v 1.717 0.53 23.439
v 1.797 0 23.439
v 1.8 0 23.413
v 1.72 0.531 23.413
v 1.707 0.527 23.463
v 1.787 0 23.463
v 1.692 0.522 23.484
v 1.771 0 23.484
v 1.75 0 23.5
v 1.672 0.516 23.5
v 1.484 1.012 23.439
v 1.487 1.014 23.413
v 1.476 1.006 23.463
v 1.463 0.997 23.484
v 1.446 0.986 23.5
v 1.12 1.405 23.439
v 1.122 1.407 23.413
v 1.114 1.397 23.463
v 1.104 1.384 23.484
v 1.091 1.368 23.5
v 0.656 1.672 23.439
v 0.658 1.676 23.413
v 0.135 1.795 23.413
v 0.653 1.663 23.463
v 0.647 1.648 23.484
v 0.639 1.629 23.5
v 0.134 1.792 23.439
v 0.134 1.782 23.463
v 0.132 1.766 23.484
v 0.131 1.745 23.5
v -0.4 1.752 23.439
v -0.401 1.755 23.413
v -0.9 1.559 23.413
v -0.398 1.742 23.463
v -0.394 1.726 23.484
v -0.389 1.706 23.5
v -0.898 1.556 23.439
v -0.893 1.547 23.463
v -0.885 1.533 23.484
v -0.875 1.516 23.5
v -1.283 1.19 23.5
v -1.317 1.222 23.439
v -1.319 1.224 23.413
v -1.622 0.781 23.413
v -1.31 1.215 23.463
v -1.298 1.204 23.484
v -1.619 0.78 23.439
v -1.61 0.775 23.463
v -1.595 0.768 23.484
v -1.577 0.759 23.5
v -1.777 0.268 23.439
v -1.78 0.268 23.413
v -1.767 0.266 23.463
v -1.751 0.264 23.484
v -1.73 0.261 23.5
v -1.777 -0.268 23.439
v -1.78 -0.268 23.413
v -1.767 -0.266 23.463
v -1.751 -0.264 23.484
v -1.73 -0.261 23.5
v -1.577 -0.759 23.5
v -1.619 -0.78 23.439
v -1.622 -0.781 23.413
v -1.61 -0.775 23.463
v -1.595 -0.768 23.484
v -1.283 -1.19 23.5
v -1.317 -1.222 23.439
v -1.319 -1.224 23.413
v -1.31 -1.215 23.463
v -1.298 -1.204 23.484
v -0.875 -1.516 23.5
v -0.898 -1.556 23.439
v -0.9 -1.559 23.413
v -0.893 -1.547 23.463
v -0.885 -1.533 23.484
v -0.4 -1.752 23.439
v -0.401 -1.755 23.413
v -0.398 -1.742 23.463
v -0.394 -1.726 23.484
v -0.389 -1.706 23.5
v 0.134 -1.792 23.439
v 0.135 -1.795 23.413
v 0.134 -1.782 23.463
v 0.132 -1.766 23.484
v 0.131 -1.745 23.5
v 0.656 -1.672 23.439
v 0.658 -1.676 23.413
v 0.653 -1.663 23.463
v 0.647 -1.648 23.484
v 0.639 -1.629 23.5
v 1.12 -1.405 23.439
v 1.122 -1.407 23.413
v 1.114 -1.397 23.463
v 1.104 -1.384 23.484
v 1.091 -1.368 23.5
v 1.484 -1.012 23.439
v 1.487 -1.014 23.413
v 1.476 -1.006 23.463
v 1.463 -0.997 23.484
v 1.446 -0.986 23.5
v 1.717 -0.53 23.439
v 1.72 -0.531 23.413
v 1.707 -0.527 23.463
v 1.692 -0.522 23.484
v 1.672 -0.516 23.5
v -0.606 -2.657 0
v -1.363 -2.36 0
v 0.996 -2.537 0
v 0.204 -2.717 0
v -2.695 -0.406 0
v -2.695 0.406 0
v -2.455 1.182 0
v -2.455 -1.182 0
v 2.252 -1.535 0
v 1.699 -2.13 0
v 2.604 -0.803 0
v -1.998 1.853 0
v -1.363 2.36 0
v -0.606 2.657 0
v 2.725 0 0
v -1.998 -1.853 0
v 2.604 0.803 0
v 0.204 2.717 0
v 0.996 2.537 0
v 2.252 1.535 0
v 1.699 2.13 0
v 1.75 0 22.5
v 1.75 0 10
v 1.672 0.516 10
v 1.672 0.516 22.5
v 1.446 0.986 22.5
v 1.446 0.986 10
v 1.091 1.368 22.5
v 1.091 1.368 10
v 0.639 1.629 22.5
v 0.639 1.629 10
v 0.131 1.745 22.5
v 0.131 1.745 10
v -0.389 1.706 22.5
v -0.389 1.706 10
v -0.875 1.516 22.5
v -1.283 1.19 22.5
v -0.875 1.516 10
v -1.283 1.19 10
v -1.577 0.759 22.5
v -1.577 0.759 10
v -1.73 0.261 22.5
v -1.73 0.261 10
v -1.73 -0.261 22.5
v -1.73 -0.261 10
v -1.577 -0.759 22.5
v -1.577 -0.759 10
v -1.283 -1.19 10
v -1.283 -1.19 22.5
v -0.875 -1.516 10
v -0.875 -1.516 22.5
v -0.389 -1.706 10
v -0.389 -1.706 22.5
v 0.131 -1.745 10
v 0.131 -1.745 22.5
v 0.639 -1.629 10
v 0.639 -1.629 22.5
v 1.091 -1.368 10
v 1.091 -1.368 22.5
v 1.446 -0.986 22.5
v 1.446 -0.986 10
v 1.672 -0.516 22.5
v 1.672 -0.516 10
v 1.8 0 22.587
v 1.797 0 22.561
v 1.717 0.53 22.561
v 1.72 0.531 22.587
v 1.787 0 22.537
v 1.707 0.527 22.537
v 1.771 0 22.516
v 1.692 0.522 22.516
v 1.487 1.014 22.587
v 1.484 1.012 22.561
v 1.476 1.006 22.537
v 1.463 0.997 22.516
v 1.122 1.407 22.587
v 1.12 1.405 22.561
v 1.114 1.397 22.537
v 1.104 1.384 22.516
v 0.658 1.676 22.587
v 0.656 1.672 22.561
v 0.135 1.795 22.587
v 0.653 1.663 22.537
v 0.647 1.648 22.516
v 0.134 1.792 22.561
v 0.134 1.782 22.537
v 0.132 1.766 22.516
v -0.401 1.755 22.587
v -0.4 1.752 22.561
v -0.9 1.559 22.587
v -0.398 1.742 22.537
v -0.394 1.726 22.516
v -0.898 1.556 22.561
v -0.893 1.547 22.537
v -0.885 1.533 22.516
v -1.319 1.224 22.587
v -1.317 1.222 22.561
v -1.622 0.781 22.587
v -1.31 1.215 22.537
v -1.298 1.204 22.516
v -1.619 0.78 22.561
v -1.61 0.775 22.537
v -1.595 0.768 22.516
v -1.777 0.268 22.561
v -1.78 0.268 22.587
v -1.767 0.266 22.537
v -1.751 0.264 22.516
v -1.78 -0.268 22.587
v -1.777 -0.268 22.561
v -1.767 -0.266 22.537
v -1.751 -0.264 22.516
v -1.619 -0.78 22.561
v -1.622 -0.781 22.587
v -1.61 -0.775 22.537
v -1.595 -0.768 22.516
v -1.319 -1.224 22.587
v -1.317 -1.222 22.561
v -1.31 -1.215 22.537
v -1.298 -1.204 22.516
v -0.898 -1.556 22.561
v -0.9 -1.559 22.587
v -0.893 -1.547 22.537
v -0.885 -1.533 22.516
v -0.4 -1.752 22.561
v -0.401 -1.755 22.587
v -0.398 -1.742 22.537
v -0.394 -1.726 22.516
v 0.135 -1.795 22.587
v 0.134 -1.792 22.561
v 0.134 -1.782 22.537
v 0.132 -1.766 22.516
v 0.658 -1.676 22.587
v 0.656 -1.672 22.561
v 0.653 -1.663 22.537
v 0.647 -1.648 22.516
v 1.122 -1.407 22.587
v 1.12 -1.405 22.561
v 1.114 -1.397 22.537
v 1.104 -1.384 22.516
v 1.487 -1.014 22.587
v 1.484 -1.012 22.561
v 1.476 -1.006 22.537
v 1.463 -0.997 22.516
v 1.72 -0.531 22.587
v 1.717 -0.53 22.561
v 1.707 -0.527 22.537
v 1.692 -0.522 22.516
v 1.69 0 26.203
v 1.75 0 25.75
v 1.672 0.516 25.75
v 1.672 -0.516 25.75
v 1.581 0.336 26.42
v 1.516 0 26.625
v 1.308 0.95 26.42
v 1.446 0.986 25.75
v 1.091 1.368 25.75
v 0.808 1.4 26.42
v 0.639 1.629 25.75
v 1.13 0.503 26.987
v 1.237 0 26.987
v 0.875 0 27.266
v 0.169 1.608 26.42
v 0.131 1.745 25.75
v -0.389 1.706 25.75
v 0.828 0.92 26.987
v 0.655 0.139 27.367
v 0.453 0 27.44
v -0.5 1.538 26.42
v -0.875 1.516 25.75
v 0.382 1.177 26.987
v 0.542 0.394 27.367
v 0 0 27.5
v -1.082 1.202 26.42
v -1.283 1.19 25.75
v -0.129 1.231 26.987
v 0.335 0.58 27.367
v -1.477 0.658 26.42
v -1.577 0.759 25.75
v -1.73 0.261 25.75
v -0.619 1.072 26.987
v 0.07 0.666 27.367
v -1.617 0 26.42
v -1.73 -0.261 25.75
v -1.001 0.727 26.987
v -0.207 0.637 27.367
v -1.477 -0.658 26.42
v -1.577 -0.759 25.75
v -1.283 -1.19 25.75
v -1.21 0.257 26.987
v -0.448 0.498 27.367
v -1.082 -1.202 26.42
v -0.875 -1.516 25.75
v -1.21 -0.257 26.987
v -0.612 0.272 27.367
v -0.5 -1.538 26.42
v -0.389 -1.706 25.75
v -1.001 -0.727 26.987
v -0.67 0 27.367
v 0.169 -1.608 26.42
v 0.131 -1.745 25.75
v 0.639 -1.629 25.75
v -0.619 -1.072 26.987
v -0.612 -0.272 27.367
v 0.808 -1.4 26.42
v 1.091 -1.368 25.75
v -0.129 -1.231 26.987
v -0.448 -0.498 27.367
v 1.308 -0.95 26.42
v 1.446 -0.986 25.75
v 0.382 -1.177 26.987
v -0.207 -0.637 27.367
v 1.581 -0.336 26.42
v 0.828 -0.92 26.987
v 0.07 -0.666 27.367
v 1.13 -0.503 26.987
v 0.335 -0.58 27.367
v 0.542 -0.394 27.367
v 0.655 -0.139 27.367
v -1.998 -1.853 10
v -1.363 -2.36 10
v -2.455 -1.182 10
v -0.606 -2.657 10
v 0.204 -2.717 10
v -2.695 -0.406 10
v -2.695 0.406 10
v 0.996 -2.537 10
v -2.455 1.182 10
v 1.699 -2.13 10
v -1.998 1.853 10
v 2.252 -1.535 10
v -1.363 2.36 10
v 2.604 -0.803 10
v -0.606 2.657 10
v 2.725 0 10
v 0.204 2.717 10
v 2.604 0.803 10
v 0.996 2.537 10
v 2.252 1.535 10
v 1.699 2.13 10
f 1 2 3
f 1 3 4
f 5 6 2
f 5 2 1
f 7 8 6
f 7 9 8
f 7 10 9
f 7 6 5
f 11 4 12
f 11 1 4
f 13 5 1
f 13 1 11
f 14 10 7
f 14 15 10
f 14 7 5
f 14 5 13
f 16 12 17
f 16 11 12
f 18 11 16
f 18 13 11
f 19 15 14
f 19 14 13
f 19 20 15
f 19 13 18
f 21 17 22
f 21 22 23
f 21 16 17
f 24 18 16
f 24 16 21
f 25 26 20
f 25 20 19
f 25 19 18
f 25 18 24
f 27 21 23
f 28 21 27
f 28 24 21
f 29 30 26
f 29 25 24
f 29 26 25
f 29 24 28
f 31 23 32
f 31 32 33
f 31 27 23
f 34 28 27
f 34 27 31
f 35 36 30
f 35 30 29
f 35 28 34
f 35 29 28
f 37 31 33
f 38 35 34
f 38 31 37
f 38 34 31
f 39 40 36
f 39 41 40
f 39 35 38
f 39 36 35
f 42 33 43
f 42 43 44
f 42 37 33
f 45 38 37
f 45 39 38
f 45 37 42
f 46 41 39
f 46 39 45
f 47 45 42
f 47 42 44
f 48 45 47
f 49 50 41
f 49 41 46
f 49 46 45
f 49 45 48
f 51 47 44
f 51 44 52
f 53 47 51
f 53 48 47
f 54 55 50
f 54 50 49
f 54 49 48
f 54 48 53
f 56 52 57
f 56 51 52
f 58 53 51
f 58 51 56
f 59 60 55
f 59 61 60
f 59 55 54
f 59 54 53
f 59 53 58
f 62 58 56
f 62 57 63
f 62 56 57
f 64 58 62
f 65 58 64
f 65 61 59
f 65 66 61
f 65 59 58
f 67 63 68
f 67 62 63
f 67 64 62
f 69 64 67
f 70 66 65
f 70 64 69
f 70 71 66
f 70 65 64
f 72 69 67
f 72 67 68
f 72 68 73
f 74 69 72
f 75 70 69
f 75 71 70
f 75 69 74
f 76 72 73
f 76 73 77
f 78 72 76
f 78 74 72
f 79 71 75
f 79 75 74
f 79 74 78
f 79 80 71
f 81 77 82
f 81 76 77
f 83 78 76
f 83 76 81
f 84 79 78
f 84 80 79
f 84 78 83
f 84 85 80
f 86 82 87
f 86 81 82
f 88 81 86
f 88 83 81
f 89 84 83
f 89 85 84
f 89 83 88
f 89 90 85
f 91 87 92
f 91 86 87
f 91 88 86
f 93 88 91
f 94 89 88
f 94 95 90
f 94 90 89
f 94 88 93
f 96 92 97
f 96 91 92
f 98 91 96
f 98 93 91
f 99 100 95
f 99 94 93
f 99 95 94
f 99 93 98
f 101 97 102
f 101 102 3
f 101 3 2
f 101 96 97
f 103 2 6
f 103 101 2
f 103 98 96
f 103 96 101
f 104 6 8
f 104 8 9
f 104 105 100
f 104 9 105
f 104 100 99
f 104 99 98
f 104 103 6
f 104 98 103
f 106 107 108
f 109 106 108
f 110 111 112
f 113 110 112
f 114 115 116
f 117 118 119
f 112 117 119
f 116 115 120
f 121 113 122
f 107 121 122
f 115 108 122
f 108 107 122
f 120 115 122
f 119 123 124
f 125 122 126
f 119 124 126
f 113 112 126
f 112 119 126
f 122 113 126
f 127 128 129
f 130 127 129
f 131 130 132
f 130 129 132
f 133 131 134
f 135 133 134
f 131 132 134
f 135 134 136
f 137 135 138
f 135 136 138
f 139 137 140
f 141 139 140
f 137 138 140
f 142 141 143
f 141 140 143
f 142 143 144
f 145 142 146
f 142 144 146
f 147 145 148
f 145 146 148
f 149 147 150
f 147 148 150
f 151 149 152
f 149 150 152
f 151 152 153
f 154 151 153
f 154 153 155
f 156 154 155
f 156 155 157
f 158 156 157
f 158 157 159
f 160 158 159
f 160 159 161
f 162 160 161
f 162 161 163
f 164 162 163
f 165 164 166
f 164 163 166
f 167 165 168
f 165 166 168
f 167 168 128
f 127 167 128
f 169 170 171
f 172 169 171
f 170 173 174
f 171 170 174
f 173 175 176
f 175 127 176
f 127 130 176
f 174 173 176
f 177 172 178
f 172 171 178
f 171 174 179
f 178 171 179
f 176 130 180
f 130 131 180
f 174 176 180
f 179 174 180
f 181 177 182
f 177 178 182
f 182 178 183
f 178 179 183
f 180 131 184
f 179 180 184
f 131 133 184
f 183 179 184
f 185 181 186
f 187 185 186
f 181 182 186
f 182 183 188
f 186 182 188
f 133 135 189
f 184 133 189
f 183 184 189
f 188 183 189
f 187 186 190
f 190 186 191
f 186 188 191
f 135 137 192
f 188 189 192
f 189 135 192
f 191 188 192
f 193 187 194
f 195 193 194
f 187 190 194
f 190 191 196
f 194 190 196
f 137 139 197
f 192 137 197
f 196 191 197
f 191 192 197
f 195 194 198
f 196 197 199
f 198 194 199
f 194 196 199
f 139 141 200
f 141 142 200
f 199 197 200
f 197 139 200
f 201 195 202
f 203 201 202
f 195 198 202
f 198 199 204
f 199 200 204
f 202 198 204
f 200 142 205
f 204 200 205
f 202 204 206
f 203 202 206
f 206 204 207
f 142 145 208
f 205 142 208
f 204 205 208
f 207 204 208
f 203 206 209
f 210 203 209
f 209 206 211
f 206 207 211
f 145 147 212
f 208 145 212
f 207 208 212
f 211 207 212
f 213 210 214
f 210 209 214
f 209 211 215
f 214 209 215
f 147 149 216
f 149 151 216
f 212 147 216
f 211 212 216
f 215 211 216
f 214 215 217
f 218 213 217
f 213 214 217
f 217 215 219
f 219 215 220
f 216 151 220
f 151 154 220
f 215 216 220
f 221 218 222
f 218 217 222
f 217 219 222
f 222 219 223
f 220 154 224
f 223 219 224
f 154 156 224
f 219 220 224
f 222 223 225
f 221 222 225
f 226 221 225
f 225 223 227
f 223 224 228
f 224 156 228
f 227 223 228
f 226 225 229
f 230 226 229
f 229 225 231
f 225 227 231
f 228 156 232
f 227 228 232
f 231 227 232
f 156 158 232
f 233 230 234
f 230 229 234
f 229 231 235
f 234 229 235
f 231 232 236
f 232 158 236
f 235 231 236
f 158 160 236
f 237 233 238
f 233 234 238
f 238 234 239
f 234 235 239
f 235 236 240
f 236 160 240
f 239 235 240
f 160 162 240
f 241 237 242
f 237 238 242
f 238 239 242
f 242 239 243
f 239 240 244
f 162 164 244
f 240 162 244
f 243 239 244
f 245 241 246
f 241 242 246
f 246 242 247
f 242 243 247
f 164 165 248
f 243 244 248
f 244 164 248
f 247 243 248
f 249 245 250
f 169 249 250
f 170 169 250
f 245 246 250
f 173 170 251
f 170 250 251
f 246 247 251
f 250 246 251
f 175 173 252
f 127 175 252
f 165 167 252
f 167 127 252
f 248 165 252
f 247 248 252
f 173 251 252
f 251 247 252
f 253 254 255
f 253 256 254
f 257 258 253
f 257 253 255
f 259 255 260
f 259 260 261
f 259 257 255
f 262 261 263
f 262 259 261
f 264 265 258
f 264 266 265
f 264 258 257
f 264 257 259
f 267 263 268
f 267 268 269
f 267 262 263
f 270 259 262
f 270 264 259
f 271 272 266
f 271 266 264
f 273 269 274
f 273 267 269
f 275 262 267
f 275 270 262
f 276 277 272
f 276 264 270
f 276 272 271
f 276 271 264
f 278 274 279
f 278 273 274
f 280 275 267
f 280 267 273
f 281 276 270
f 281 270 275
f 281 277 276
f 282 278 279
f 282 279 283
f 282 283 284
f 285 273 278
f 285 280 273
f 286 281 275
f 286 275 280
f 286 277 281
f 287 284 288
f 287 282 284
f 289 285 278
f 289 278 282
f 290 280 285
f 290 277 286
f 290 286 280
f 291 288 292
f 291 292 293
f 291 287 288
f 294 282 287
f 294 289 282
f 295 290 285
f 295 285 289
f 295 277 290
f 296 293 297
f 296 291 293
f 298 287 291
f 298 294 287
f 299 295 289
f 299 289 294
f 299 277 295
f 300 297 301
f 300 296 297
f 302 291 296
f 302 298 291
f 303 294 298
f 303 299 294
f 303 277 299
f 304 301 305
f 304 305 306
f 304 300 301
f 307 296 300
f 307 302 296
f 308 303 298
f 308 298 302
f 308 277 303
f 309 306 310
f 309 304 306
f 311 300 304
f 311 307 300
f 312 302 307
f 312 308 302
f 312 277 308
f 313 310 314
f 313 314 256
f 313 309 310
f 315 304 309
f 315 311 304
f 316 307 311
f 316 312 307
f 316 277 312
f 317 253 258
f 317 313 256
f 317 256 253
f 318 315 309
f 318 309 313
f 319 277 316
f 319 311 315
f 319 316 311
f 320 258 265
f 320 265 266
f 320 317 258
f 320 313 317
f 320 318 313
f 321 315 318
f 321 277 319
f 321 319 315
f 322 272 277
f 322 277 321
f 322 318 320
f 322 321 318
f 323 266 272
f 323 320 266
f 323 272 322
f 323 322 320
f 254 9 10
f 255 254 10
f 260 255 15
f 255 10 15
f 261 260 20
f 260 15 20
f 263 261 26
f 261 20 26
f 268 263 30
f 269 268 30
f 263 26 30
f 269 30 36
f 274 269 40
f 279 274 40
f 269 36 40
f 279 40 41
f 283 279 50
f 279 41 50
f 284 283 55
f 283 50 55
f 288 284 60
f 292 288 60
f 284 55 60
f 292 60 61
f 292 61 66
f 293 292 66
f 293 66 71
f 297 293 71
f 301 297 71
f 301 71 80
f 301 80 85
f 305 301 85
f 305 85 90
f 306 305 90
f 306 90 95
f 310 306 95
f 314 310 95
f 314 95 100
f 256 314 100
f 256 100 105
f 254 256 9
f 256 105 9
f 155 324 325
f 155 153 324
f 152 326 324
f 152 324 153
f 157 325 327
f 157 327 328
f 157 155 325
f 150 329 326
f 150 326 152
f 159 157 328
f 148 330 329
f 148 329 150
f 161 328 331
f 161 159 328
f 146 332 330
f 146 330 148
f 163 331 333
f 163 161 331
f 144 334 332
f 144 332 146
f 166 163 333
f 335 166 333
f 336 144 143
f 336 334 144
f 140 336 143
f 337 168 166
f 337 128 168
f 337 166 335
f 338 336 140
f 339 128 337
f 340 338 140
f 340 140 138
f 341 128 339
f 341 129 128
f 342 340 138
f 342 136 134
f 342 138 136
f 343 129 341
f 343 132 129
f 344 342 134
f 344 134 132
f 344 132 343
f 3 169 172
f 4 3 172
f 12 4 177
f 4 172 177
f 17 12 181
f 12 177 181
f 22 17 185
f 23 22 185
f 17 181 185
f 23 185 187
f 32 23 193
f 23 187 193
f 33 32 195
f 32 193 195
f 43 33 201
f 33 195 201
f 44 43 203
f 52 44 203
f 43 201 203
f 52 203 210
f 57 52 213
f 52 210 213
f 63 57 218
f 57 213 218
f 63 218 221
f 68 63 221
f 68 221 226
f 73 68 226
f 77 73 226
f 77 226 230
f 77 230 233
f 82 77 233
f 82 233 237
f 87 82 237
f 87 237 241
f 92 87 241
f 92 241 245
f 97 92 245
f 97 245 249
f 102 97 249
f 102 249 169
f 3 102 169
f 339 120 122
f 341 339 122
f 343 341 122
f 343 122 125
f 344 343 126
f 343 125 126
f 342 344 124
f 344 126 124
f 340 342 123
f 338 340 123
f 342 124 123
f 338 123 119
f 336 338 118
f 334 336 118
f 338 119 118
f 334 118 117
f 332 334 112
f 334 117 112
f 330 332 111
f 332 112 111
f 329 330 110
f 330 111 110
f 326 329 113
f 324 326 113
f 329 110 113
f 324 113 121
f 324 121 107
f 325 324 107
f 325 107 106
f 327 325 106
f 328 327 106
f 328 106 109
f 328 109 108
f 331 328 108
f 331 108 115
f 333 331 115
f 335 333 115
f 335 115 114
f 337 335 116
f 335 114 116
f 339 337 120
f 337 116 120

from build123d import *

# Parameters (mm, degrees)
F0_R     = 2.725
F1_DEPTH = 10
F2_R     = 1.75
F3_DEPTH = 12.5
F4_R     = 1.8
F4_R_2   = 1.75
F5_DEPTH = 1
F6_R     = 1.75
F7_DEPTH = 4
F9_R     = 1.75


# Not quite as in the source:
# - a fillet or chamfer that OpenCascade refuses, or shapes differently, is made with other operations: its cross-section is extruded or revolved along the edge and cut away or added


with BuildPart() as f1:
    # F0 (on Top) → F1 (new body)
    with BuildSketch(Plane.XY):
        Circle(F0_R)
    extrude(amount=F1_DEPTH)

    # F2 (on face) → F3 (join)
    with BuildSketch(Plane.XY.offset(10)):
        Circle(F2_R)
    extrude(amount=F3_DEPTH)

    # F4 (on face) → F5 (join)
    with BuildSketch(Plane.XY.offset(22.5)):
        Circle(F4_R)
        Circle(F4_R_2, mode=Mode.SUBTRACT)
        Circle(F4_R_2)
    extrude(amount=F5_DEPTH)

    # F6 (on face) → F7 (join)
    with BuildSketch(Plane.XY.offset(23.5)):
        Circle(F6_R)
    extrude(amount=F7_DEPTH)

    # F8: fillet of radius 0.1 on 2 edges, made by hand

    # F8_s1 → F8_t2 (revolve, cut)
    with BuildSketch(Plane.XZ):
        with BuildLine():
            ThreePointArc((1.8, 23.4133974596), (1.7866025404, 23.4633974596), (1.75, 23.5))
            Line((1.75, 23.5), (1.8, 23.5))
            Line((1.8, 23.5), (1.8, 23.4133974596))
        make_face()
    revolve(axis=Axis((0, 0, 23.5), (0, 0, 1)), mode=Mode.SUBTRACT)

    # F8_s3 → F8_t4 (revolve, cut)
    with BuildSketch(Plane.XZ):
        with BuildLine():
            ThreePointArc((1.8, 22.5866025404), (1.7866025404, 22.5366025404), (1.75, 22.5))
            Line((1.75, 22.5), (1.8, 22.5))
            Line((1.8, 22.5), (1.8, 22.5866025404))
        make_face()
    revolve(axis=Axis((0, 0, 22.5), (0, 0, 1)), mode=Mode.SUBTRACT)

    # F9
    f9_edges = [f1.edges().sort_by_distance(p)[0] for p in [
        (-1.75, 0, 27.5),
    ]]
    fillet(f9_edges, radius=F9_R)


solid = f1.part
